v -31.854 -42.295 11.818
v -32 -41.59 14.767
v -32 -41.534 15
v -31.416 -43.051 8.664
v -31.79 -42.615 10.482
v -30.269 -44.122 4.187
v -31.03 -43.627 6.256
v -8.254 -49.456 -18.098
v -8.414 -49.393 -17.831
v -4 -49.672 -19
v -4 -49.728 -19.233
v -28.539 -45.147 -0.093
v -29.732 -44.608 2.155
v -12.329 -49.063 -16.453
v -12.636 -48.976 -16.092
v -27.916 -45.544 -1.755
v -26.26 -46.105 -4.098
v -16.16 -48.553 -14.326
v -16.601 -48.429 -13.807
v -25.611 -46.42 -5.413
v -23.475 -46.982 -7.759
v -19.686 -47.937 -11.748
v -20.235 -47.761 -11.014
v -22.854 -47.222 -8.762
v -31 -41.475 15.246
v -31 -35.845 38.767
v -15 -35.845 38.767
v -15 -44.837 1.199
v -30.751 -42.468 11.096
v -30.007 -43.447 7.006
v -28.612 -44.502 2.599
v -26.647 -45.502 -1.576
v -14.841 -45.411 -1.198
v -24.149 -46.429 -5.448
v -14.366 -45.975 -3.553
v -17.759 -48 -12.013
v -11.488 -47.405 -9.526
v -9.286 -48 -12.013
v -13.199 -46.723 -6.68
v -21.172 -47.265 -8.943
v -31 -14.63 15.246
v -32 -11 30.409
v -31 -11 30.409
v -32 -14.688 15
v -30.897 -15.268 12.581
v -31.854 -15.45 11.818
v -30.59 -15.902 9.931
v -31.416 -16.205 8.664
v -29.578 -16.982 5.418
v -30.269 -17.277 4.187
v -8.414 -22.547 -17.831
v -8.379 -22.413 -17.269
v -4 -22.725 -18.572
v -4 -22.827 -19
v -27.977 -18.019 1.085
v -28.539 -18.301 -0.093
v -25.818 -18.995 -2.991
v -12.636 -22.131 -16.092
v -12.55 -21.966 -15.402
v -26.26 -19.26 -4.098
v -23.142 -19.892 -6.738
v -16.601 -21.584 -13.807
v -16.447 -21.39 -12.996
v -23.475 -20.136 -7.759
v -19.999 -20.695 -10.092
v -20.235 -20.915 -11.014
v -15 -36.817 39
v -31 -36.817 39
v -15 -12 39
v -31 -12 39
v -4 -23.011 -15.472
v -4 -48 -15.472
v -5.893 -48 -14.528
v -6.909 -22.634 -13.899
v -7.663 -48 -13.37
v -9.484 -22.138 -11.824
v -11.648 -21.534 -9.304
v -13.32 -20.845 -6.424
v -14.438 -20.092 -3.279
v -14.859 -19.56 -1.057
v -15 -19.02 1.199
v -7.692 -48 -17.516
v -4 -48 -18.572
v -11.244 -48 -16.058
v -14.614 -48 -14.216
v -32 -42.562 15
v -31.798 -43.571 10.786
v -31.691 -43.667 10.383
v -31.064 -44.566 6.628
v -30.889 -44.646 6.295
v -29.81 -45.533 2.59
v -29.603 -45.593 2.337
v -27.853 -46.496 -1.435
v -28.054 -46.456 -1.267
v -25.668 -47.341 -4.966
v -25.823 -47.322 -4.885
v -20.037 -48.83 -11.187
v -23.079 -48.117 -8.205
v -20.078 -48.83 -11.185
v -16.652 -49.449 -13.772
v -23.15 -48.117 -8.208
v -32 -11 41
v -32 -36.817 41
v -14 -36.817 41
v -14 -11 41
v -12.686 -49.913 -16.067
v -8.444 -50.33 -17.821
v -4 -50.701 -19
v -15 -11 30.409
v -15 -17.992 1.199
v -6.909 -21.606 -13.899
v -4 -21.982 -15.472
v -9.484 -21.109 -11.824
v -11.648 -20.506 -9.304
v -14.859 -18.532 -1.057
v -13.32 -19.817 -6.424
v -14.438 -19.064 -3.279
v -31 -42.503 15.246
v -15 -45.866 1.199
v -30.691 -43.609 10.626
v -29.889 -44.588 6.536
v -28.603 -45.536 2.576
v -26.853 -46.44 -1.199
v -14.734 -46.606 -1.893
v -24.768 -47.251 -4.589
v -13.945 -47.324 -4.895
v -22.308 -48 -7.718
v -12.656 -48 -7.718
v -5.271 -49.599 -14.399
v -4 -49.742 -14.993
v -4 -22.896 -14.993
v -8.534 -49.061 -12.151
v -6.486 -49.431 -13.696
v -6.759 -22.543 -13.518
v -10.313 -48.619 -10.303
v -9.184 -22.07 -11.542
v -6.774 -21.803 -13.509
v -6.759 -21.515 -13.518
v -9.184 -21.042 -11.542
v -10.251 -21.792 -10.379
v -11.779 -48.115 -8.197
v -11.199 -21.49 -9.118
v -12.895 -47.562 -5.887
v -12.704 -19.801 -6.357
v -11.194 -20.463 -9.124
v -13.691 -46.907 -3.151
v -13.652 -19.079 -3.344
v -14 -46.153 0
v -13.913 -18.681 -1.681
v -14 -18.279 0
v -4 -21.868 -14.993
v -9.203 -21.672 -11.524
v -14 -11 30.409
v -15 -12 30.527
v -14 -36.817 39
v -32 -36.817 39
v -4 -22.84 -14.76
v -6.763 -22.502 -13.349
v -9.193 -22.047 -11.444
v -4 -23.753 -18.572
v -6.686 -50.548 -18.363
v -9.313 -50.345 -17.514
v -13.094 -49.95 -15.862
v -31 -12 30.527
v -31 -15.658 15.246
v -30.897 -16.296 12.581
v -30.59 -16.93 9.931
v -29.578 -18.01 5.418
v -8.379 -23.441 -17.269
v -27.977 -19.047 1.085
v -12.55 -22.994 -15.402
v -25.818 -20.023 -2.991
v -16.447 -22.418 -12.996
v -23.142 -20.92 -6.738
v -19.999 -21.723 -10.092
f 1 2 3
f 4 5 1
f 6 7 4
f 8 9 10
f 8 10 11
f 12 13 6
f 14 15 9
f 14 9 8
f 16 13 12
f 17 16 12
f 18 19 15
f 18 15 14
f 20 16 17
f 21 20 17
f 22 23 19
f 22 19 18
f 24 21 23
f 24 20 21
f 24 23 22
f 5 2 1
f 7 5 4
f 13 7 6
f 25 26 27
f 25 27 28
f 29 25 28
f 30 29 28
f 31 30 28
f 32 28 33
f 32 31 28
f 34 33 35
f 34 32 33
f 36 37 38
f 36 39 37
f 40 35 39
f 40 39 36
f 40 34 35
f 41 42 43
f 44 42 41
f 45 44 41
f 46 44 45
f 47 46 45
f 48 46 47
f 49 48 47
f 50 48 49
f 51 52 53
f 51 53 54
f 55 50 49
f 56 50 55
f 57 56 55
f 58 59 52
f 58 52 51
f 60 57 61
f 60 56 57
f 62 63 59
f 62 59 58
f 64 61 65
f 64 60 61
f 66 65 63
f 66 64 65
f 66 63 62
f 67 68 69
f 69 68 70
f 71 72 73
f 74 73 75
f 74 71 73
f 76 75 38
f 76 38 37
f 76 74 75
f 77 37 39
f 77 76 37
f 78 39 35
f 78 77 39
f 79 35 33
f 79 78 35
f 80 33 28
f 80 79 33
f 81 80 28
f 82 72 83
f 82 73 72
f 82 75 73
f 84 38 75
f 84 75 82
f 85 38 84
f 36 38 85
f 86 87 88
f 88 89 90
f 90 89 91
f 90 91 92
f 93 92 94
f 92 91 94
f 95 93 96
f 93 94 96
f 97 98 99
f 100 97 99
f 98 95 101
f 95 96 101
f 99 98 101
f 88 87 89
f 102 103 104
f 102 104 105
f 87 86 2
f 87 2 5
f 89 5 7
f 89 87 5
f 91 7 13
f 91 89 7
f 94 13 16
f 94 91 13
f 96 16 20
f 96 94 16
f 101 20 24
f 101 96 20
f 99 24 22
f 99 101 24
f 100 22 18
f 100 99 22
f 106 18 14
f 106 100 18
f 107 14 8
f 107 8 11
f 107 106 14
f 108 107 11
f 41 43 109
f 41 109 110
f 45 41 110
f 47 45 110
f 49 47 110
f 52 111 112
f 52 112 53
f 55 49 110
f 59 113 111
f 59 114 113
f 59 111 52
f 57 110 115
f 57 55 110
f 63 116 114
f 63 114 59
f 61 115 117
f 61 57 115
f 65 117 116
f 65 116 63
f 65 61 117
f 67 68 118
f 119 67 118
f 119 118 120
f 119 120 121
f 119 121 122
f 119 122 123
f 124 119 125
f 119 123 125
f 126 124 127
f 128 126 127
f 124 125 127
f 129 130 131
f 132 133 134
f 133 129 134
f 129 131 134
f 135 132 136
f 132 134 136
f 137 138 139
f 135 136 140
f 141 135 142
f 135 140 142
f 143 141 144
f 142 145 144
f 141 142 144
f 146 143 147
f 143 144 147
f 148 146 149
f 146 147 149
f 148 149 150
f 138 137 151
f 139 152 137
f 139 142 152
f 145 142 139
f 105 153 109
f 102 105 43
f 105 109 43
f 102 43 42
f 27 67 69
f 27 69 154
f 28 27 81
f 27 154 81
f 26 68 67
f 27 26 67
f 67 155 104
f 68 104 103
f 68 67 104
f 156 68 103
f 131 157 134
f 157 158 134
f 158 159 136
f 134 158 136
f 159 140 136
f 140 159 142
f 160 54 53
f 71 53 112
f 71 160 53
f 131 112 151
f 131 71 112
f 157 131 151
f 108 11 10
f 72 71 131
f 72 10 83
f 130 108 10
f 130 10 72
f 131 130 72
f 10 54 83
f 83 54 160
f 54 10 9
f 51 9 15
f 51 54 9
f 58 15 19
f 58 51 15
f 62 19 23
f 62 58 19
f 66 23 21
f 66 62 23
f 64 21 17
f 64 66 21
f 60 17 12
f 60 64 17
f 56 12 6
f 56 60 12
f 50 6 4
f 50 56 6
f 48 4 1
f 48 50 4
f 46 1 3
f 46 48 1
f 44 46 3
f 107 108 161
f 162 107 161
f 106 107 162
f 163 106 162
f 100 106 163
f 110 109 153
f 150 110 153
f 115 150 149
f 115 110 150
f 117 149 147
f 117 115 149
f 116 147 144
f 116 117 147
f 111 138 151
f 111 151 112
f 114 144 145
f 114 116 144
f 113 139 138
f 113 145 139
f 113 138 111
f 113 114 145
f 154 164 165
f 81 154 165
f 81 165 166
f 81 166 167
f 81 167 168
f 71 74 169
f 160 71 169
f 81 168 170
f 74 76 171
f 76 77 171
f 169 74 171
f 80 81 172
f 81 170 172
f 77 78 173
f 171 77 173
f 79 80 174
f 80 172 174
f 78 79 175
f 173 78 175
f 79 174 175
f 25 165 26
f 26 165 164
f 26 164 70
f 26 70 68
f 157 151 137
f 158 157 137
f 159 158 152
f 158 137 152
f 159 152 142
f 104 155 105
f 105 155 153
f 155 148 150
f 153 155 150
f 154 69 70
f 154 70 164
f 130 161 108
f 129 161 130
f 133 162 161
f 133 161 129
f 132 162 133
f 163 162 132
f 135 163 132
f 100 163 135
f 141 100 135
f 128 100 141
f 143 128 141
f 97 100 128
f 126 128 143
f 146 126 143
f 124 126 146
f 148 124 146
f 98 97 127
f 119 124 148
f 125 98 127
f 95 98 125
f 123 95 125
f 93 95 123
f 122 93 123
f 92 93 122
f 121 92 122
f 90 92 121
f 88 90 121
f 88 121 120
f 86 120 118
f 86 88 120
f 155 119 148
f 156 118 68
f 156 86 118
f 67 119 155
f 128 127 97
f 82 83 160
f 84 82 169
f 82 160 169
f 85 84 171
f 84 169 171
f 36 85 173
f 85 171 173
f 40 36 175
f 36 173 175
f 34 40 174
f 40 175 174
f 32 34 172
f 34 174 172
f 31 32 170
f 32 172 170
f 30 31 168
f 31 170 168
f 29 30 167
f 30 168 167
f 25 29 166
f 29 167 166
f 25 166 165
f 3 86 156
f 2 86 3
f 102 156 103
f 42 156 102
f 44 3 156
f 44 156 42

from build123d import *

# Parameters (mm, degrees)
SKETCH035_W     = 48
SKETCH035_H     = 58
PAD_DEPTH       = 18
PAD_DEPTH_BACK  = 10
POCKET_DEPTH    = 28.001
POCKET001_DEPTH = 39.7016683899
POCKET002_DEPTH = 39.7016683899
POCKET003_DEPTH = 37
PAD001_DEPTH    = 1
PAD002_DEPTH    = 1
SKETCH047_W     = 8.5912555575
SKETCH047_H     = 18
PAD003_DEPTH    = 1
SKETCH048_W     = 25.8171292066
SKETCH048_H     = 18
PAD004_DEPTH    = 2


with BuildPart() as part:
    # Sketch035 → Pad (new body, two sides)
    with BuildSketch(Plane(origin=(-14, 0, 0), x_dir=(0, -1, 0), z_dir=(-1, 0, 0))) as pad_sk:
        with Locations((35, 10)):
            Rectangle(SKETCH035_W, SKETCH035_H)
    extrude(amount=PAD_DEPTH)
    extrude(pad_sk.sketch, amount=-PAD_DEPTH_BACK)

    # Sketch037 (on Face6 of Pad) → Pocket (cut, through all)
    with BuildSketch(Plane(origin=(-32, 0, 0), x_dir=(0, -1, 0), z_dir=(-1, 0, 0))):
        Polygon((5.2832016696, 54.2912933219), (25.506728, -30.1946948458), (-54.670101, -30.1946948458), (-35.189949, 60.570816), (99.69088, 60.570816), (63.150125, -71.0089635543), (31.712076, 60.3269168671), align=None)
    extrude(amount=-POCKET_DEPTH, mode=Mode.SUBTRACT)

    # Sketch038 (on Face5 of Pocket) → Pocket001 (cut, through all)
    with BuildSketch(Plane(origin=(-14, -11, 0), x_dir=(0, 0, -1), z_dir=(0, 1, 0))):
        with BuildLine():
            Line((-54.22, 0), (0, 0))
            ThreePointArc((6.64, -31.06), (15.8809099236, -12.8447314265), (0, 0))
            Line((-54.22, -31.06), (6.64, -31.06))
            Line((-54.22, 0), (-54.22, -31.06))
        make_face()
    extrude(amount=-POCKET001_DEPTH, mode=Mode.SUBTRACT)

    # Sketch039 (on Face5 of Pocket001) → Pocket002 (cut, through all)
    with BuildSketch(Plane(origin=(-14, -11, 0), x_dir=(0, 0, -1), z_dir=(0, 1, 0))):
        with BuildLine():
            Line((-54.093197, 18), (-15, 18))
            ThreePointArc((19, -10), (7.0227155455, 10.0990117339), (-15, 18))
            Line((19, -10), (21.080846, -20.6503515699))
            Line((21.080846, -20.6503515699), (53.173771, 36.372562))
            Line((53.173771, 36.372562), (-65.403534, 96.827888))
            Line((-65.403534, 96.827888), (-54.093197, 18))
        make_face()
    extrude(amount=-POCKET002_DEPTH, mode=Mode.SUBTRACT)

    # Sketch043 (on Face5 of Pocket002) → Pocket003 (cut)
    with BuildSketch(Plane(origin=(-14, -11, 0), x_dir=(0, 0, -1), z_dir=(0, 1, 0))):
        with BuildLine():
            Line((-15.245619, 17), (-45.757725, 17))
            Line((-45.757725, 17), (-45.757725, 1))
            Line((-45.757725, 1), (-1.199132, 1))
            ThreePointArc((15.9159831091, -11.1438635069), (9.2937296934, -2.3443851955), (-1.199132, 1))
            Line((15.9159831091, -11.1438635069), (19.157257, -22.045523))
            ThreePointArc((19.157257, -22.045523), (10.774136684, 5.2470278766), (-15.245619, 17))
        make_face()
    extrude(amount=-POCKET003_DEPTH, mode=Mode.SUBTRACT)

    # Sketch045 (on Face2 of Pocket003) → Pad001 (join)
    with BuildSketch(Plane(origin=(-14, -43.6514436381, 10.4489056579), x_dir=(0, 0.2327948443, 0.9725258662), z_dir=(0, -0.9725258662, 0.2327948443))):
        with BuildLine():
            Line((4.6796640586, 18), (29.3576709206, 18))
            Line((29.3576709206, 18), (29.3576709206, 0))
            Line((29.3576709206, 0), (-10.7440902302, 0))
            ThreePointArc((-10.7440902303, 0), (-19.9801823393, -2.6447416067), (-26.1608157681, -10))
            Line((-30.2808456627, -10), (-26.1608157681, -10))
            ThreePointArc((4.6796640586, 18), (-17.8355499986, 10.2865978549), (-30.2808456627, -10))
        make_face()
    extrude(amount=-PAD001_DEPTH)

    # Sketch046 (on Face14 of Pad001) → Pad002 (join)
    with BuildSketch(Plane(origin=(-14, -17.2883817298, 4.1383435373), x_dir=(0, -0.2327948443, -0.9725258662), z_dir=(0, 0.9725258662, -0.2327948443))):
        with BuildLine():
            Line((-11.1685013634, 18), (-27.012547242, 18))
            Line((-27.012547242, 18), (-27.012547242, 0))
            Line((-27.012547242, 0), (4.2552529254, 0))
            ThreePointArc((19.6719784632, -10), (13.534807381, -2.5777368999), (4.2552529254, 0))
            Line((19.6719784632, -10), (23.7920083579, -10))
            ThreePointArc((23.7920083579, -10), (11.1478849959, 10.0383436525), (-11.1685013634, 18))
        make_face()
    extrude(amount=-PAD002_DEPTH)

    # Sketch047 (on Face4 of Pad002) → Pad003 (join)
    with BuildSketch(Plane(origin=(-14, -11, 0), x_dir=(0, 0, -1), z_dir=(0, 1, 0))):
        with Locations((-34.7043722212, 9)):
            Rectangle(SKETCH047_W, SKETCH047_H)
    extrude(amount=-PAD003_DEPTH)

    # Sketch048 (on Face1 of Pad003) → Pad004 (join)
    with BuildSketch(Plane(origin=(-14, 0, 39), x_dir=(0, 1, 0), z_dir=(0, 0, 1))):
        with Locations((-23.9085646033, 9)):
            Rectangle(SKETCH048_W, SKETCH048_H)
    extrude(amount=PAD004_DEPTH)


solid = part.part
